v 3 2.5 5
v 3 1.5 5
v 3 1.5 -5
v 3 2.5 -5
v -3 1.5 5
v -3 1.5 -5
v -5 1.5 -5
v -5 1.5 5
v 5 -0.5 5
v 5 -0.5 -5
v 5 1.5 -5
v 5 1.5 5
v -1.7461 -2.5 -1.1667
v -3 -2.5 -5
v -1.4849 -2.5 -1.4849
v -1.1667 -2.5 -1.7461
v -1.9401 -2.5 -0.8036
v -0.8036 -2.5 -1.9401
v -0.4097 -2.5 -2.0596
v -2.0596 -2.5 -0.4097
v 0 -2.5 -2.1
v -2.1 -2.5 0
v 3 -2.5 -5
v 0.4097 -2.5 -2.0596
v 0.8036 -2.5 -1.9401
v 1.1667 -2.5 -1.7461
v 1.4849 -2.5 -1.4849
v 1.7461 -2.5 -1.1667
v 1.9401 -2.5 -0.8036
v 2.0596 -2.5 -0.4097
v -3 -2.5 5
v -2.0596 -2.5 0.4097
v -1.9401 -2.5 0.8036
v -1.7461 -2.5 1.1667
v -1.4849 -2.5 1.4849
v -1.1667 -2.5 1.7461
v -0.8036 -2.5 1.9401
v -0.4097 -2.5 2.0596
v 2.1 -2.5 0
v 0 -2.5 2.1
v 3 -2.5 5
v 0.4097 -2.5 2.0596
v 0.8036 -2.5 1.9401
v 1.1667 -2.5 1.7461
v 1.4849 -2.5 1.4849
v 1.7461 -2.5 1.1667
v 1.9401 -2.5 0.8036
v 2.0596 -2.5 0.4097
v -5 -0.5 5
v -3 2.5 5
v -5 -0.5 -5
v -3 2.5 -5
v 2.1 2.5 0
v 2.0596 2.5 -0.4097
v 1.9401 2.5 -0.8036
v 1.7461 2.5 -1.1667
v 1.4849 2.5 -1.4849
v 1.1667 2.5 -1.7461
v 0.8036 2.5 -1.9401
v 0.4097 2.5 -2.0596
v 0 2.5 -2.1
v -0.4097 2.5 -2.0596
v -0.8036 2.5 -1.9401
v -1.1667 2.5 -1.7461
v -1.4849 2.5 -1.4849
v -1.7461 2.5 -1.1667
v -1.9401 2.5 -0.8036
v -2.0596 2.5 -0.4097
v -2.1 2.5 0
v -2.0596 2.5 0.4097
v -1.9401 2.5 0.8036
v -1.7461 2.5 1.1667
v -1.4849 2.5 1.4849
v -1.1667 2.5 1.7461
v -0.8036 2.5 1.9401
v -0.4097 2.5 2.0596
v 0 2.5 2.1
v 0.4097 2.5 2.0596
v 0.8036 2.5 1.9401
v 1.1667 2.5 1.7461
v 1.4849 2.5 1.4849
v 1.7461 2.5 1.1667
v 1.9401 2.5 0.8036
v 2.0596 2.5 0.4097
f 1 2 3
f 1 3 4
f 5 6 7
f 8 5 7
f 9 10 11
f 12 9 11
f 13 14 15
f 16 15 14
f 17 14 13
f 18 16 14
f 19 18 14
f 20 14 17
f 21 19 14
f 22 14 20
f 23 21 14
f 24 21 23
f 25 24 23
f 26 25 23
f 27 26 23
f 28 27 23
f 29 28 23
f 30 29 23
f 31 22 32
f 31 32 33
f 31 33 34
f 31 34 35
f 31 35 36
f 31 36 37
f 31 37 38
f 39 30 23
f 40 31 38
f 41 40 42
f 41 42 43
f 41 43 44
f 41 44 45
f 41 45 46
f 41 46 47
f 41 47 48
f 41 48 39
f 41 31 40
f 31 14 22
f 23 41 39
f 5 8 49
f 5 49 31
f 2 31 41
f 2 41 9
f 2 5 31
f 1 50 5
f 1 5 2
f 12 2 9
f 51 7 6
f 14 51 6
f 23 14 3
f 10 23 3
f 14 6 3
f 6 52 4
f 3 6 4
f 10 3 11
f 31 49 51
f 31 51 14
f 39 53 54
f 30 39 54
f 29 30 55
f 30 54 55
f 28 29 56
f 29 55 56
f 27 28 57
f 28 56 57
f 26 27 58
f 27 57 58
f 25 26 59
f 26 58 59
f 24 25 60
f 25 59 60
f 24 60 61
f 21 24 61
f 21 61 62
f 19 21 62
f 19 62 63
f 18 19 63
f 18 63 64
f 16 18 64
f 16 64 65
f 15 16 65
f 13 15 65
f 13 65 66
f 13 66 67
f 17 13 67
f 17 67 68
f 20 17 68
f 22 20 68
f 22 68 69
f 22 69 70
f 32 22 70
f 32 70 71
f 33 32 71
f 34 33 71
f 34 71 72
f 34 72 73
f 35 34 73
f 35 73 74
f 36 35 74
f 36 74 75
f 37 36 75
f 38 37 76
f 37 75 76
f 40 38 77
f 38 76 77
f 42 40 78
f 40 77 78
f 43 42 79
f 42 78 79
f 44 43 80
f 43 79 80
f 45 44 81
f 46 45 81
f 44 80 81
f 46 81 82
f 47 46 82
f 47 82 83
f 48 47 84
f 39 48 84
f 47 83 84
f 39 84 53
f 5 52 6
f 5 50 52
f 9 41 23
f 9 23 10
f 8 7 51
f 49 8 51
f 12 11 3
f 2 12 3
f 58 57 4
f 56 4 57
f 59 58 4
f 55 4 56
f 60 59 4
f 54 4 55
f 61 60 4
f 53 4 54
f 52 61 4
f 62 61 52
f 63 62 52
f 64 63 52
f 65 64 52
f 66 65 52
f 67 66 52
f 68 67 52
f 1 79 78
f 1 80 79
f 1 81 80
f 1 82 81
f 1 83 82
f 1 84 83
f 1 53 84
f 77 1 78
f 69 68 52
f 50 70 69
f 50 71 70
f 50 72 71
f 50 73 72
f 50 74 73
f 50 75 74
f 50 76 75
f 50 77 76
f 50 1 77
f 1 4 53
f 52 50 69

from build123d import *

# Parameters (mm, degrees)
BOSS_EXTRUDE1_DEPTH = 5
SKETCH2_R           = 2.1
CUT_EXTRUDE1_DEPTH  = 6


with BuildPart() as part:
    # Sketch1 → Boss-Extrude1 (new body, symmetric)
    with BuildSketch(Plane.XY):
        Polygon((-5, 1.5), (-5, -0.5), (-3, -2.5), (3, -2.5), (5, -0.5), (5, 1.5), (3, 1.5), (3, 2.5), (-3, 2.5), (-3, 1.5), align=None)
    extrude(amount=BOSS_EXTRUDE1_DEPTH, both=True)

    # Sketch2 → Cut-Extrude1 (cut, through all)
    with BuildSketch(Plane(origin=(0, 2.5, 0), x_dir=(1, 0, 0), z_dir=(0, 1, 0))):
        Circle(SKETCH2_R)
    extrude(amount=-CUT_EXTRUDE1_DEPTH, mode=Mode.SUBTRACT)


solid = part.part
